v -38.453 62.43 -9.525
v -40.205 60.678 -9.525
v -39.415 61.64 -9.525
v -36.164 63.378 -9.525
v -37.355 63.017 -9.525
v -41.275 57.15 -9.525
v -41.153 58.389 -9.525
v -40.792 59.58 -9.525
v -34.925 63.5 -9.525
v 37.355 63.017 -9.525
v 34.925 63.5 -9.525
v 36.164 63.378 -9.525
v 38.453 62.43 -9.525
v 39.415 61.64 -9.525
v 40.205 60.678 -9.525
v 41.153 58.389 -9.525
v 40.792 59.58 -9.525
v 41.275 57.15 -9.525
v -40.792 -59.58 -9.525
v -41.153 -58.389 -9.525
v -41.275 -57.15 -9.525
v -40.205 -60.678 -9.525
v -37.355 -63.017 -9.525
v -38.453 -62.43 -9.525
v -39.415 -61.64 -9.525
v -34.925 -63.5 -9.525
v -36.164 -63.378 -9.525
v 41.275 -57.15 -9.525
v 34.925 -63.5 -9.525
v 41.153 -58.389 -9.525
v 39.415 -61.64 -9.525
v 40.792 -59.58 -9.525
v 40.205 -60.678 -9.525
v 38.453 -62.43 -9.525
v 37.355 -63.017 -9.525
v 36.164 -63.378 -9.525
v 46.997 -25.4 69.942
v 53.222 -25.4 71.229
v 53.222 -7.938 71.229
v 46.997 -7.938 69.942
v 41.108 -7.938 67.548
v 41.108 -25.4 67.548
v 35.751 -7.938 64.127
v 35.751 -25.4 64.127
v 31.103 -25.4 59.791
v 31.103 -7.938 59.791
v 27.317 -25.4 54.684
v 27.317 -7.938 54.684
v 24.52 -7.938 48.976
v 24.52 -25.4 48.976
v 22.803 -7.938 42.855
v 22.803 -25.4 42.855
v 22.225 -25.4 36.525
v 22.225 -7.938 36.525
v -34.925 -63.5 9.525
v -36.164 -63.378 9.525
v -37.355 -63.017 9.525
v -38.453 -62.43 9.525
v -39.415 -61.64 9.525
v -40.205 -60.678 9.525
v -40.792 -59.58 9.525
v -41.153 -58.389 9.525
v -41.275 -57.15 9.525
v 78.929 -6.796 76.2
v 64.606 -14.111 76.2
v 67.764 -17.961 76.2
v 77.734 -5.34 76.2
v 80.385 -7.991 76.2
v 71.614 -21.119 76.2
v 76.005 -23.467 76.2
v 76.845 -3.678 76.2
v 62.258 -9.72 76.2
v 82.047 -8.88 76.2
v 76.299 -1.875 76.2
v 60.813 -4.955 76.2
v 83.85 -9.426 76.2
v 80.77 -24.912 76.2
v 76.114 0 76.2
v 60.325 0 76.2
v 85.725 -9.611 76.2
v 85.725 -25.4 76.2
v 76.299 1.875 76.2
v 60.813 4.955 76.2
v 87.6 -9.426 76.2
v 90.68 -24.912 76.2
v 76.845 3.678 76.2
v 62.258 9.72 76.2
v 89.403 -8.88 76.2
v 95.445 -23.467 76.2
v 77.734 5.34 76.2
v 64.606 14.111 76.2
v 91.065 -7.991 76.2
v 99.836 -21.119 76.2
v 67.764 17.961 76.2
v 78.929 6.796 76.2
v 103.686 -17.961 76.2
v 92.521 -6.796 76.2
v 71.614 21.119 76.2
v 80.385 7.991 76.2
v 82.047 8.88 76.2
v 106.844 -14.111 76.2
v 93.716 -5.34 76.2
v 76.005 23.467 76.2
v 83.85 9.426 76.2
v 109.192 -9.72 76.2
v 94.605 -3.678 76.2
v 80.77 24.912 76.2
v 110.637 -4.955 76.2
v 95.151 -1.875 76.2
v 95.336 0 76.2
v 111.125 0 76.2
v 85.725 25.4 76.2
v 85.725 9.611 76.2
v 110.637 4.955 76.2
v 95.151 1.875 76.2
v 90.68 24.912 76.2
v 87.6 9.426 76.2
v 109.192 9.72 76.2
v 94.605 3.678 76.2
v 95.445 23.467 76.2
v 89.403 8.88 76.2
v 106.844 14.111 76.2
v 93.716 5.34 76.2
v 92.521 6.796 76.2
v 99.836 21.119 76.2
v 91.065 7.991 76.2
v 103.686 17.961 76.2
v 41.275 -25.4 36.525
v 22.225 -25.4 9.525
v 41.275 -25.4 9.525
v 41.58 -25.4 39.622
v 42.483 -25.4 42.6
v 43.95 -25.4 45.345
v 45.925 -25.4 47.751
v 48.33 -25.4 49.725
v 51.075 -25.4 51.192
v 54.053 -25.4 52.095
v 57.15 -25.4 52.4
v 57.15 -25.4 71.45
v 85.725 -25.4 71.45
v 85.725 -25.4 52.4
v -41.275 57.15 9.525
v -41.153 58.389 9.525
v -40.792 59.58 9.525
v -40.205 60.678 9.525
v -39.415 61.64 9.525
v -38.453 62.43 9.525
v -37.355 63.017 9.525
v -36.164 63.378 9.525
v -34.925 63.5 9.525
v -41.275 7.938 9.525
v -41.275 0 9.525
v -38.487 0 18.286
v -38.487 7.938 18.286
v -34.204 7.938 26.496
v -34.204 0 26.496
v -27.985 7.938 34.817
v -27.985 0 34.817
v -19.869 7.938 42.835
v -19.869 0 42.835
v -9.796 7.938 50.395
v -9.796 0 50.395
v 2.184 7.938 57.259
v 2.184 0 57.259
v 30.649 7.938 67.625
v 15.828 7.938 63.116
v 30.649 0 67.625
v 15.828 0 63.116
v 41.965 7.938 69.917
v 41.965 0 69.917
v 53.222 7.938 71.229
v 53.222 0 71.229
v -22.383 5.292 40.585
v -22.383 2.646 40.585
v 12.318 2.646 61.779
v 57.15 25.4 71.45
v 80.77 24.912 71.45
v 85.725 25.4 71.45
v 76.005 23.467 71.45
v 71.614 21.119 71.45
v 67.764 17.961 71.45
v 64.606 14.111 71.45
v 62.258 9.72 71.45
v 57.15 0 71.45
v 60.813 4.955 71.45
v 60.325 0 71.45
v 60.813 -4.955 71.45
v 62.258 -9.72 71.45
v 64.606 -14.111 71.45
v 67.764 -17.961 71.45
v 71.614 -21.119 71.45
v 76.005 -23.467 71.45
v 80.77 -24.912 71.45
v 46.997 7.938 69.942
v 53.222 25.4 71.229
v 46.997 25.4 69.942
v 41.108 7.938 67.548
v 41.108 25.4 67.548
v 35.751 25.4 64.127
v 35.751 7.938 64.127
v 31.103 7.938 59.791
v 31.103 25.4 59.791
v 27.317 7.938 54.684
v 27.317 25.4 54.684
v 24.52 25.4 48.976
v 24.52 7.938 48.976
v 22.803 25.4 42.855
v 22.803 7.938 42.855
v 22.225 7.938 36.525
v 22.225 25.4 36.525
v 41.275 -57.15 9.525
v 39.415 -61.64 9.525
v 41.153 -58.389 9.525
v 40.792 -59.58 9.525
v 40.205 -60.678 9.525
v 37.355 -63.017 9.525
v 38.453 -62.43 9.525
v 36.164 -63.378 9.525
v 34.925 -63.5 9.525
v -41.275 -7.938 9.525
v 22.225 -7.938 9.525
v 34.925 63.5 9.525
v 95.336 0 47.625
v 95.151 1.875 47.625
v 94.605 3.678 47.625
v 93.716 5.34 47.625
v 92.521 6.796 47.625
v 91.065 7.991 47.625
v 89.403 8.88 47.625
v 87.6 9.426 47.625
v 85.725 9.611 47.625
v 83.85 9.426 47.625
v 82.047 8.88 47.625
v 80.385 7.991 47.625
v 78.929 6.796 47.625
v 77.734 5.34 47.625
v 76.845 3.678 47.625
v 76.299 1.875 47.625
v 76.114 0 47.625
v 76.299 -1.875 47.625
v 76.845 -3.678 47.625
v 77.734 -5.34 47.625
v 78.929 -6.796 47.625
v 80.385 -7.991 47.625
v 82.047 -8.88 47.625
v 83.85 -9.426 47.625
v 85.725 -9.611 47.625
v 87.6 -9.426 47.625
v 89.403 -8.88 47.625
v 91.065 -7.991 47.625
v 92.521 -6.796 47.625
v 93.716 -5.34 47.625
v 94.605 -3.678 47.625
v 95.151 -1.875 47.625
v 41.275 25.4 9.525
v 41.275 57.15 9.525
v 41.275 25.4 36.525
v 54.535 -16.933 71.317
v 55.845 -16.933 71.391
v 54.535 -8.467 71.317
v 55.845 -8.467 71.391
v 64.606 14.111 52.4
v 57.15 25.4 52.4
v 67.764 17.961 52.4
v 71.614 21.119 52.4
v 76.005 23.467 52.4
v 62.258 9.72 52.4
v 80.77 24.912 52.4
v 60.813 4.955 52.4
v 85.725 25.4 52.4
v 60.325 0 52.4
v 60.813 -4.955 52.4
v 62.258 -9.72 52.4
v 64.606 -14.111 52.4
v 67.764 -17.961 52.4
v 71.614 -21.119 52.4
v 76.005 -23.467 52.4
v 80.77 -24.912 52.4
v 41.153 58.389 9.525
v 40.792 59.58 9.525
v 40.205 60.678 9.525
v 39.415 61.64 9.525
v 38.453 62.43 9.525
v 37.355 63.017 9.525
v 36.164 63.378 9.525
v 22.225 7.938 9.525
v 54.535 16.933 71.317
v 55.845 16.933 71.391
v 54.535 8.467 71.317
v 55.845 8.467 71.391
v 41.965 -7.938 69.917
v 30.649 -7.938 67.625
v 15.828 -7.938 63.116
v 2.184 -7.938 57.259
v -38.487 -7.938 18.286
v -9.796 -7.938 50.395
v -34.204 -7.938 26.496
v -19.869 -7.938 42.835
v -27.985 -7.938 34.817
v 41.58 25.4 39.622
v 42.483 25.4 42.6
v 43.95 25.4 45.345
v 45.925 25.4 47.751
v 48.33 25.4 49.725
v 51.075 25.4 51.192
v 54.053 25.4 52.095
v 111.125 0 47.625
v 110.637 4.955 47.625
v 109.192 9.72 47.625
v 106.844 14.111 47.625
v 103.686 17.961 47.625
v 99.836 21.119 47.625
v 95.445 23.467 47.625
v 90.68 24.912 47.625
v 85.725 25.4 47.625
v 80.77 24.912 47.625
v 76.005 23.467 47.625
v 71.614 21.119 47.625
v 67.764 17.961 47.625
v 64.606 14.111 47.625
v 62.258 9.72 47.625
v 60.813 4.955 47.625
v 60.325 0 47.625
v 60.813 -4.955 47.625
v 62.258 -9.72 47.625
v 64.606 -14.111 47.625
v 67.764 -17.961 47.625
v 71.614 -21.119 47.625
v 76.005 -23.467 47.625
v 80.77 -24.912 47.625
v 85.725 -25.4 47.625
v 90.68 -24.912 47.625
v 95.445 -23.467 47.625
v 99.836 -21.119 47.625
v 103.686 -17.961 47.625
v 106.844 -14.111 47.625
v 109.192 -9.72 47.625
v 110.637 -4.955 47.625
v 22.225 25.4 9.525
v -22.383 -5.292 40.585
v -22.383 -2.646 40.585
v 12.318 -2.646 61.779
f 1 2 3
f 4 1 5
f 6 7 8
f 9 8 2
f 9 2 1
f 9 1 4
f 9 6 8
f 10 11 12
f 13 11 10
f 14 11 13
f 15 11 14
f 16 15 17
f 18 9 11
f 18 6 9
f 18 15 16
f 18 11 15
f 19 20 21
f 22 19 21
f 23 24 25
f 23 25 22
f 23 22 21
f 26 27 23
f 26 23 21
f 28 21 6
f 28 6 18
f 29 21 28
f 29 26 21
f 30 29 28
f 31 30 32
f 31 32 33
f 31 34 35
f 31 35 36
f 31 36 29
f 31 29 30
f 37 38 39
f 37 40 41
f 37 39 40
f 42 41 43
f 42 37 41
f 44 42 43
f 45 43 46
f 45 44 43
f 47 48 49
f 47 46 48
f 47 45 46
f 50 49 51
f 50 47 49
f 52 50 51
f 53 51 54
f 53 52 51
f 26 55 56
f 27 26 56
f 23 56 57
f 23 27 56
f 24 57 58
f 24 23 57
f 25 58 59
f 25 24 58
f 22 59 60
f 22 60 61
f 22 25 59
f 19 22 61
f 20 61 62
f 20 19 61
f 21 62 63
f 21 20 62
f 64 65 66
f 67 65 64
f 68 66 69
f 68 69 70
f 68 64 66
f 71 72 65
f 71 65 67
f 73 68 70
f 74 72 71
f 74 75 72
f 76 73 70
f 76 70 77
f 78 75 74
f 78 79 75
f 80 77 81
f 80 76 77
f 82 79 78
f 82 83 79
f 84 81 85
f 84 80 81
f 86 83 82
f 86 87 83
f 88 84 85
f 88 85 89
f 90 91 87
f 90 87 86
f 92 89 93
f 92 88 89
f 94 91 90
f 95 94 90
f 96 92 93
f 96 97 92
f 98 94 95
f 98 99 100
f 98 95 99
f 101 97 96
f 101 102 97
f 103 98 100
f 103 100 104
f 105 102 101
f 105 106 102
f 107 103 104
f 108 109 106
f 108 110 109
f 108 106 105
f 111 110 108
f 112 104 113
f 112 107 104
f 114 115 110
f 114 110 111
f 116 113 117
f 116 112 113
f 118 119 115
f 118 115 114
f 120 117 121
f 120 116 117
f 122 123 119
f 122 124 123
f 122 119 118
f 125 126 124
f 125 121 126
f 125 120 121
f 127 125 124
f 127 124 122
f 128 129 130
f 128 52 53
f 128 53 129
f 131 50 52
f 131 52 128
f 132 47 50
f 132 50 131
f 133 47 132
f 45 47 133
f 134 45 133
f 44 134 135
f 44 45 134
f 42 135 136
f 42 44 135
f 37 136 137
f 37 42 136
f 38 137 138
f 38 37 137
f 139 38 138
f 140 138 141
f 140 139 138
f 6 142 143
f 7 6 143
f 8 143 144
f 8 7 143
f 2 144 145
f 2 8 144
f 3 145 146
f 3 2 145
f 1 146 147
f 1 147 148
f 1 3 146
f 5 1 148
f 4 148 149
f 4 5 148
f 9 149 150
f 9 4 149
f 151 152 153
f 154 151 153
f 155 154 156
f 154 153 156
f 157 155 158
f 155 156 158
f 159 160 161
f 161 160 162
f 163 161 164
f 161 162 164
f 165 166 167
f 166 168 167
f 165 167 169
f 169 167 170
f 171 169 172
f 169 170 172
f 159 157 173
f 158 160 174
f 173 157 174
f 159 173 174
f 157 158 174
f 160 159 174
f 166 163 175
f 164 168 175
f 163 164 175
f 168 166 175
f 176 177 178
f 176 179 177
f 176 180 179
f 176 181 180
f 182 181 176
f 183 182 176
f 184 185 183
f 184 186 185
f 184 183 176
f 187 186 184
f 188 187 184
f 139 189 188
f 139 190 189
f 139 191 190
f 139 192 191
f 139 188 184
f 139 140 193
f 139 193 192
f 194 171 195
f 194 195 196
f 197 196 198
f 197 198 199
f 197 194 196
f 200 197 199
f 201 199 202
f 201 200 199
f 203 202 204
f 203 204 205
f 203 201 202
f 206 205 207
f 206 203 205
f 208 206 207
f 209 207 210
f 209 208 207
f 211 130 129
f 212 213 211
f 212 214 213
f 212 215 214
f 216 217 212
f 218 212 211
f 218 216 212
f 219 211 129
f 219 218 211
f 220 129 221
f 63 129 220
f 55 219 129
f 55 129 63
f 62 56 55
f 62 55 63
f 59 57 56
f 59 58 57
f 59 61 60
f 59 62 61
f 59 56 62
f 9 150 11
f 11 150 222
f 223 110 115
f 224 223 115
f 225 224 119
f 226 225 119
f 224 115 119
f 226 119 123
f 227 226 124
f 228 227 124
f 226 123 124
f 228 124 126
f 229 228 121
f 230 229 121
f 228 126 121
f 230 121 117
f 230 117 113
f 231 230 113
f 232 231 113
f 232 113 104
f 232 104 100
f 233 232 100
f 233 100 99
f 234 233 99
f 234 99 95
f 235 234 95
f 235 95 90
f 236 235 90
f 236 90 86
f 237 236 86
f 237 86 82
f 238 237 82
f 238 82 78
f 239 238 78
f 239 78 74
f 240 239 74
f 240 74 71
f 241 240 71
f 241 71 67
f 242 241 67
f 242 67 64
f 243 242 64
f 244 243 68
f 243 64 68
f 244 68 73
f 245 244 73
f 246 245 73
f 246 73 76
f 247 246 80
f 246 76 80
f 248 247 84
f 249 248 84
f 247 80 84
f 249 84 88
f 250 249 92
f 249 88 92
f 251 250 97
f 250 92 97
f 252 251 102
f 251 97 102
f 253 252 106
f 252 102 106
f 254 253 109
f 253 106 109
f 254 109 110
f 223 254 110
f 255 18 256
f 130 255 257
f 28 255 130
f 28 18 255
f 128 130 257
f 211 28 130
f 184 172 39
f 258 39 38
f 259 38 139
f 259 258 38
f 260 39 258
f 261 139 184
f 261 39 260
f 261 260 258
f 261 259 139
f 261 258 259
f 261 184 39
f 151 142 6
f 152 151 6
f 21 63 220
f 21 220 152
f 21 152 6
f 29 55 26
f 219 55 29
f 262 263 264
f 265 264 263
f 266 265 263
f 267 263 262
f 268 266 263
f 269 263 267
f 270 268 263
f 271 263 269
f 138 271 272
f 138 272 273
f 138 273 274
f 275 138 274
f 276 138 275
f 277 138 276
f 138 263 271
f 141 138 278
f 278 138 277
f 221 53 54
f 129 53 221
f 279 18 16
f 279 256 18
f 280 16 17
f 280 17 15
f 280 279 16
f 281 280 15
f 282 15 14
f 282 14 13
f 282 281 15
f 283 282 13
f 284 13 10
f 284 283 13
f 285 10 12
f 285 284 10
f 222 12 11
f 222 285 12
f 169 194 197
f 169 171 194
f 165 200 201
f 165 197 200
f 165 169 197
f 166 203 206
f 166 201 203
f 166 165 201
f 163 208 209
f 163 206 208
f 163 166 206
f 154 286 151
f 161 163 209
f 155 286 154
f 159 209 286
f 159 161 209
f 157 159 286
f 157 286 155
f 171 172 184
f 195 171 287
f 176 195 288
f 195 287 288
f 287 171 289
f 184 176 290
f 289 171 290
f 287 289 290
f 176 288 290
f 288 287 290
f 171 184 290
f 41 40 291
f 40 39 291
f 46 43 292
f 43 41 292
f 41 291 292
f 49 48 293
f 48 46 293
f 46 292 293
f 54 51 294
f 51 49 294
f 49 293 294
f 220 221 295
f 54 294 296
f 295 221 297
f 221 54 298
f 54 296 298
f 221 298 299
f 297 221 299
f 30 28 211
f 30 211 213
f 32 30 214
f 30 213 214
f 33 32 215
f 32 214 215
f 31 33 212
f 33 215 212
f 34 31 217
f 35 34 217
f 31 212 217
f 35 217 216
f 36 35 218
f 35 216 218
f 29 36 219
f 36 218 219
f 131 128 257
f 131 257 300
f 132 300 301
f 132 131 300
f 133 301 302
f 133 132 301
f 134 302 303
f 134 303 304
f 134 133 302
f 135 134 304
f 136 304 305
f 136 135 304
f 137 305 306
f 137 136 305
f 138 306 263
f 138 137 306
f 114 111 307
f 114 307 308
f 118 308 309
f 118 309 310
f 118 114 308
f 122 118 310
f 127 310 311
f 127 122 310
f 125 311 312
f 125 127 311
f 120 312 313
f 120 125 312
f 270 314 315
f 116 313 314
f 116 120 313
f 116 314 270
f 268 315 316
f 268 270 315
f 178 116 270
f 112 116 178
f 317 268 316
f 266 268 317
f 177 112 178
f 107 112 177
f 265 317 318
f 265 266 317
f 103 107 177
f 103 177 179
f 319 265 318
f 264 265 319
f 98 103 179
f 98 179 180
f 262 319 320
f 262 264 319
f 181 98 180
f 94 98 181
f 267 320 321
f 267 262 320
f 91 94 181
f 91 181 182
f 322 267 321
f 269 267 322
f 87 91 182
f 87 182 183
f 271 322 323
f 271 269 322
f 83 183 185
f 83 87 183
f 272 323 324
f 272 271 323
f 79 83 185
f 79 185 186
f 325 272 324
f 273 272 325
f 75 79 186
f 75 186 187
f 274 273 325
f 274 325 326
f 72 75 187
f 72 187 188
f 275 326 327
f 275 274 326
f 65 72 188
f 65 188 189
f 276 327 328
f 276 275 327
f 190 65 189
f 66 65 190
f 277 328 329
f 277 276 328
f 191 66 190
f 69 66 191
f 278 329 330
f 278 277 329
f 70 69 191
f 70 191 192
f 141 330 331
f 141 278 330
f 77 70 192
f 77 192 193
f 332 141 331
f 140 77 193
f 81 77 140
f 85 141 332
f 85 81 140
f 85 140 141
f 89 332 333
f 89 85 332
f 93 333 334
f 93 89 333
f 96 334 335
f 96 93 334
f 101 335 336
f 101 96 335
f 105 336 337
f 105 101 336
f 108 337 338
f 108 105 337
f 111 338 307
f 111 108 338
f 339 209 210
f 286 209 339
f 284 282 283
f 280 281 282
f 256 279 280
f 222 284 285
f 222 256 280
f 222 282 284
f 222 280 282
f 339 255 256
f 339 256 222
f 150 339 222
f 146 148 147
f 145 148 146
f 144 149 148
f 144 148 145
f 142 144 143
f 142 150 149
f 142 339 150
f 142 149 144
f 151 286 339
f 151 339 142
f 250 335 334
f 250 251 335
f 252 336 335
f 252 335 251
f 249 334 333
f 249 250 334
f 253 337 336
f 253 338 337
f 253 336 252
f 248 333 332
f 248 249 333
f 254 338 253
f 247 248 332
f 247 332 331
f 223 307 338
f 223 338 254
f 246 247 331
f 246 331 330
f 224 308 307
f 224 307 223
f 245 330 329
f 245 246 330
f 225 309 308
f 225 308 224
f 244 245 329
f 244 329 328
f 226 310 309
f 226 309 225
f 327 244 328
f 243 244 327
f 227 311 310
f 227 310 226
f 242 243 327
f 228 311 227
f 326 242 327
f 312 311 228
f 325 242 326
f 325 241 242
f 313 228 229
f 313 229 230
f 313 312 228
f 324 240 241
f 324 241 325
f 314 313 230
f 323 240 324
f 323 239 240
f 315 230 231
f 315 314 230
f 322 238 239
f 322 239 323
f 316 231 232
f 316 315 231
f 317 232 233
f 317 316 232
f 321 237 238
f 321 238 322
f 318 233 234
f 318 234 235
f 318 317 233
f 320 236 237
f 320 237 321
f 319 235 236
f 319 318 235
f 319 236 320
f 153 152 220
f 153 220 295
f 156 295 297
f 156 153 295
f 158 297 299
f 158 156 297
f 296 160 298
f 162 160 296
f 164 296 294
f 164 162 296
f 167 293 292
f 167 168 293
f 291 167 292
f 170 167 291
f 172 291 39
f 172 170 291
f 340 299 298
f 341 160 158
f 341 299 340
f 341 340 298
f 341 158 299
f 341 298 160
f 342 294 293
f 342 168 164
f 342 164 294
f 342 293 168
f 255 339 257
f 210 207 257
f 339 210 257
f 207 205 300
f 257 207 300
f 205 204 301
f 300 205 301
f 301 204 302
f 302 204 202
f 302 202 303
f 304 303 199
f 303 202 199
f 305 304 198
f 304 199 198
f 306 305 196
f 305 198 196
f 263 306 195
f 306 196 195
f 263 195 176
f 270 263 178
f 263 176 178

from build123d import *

# Parameters (mm, degrees)
F1_DEPTH = 63.5
F2_DEPTH = 25.4
F3_DEPTH = 7.9375
F5_R     = 6.35
F6_R     = 9.6111188935
F7_DEPTH = 85.726


with BuildPart() as f1:
    # F0 (on Front) → F1 (new body, symmetric)
    with BuildSketch(Plane.XZ):
        Polygon((-41.275, 9.525), (-41.275, -9.525), (41.275, -9.525), (41.275, 9.525), (22.225, 9.525), align=None)
    extrude(amount=F1_DEPTH, both=True)

    # F0 (on Front) → F2 (join, symmetric)
    with BuildSketch(Plane.XZ):
        with BuildLine():
            Line((22.225, 9.525), (41.275, 9.525))
            Line((41.275, 9.525), (41.275, 36.5252))
            ThreePointArc((41.275, 36.5252), (45.9246798487, 47.7505201513), (57.15, 52.4002))
            Line((57.15, 52.4002), (60.325, 52.4002))
            Line((60.325, 52.4002), (60.325, 71.4502))
            Line((60.325, 71.4502), (57.15, 71.4502))
            add(Edge.make_bspline(
                [(53.2220163185, 71.2286086107), (54.5371358708, 71.3237902727), (55.8469463929, 71.3977482988), (57.15, 71.4502)],
                knots=[112.6539740509, 112.6539740509, 112.6539740509, 112.6539740509, 116.2850421165, 116.2850421165, 116.2850421165, 116.2850421165], degree=3))
            ThreePointArc((53.2220163185, 71.2286086107), (31.1025389426, 59.790740988), (22.225, 36.5252))
            Line((22.225, 36.5252), (22.225, 9.525))
        make_face()
        Polygon((85.725, 71.4502), (60.325, 71.4502), (60.325, 52.4002), (85.725, 52.4002), (85.725, 61.9125), align=None)
    extrude(amount=F2_DEPTH, both=True)

    # F0 (on Front) → F3 (join, symmetric)
    with BuildSketch(Plane.XZ):
        with BuildLine():
            add(Edge.make_bspline(
                [(-41.275, 9.525), (-33.4914332719, 44.8937261862), (12.4204005857, 68.2755952564), (53.2220163185, 71.2286086107)],
                knots=[0, 0, 0, 0, 112.6539740509, 112.6539740509, 112.6539740509, 112.6539740509], degree=3))
            Line((-41.275, 9.525), (22.225, 9.525))
            Line((22.225, 9.525), (22.225, 36.5252))
            ThreePointArc((22.225, 36.5252), (31.1025389426, 59.790740988), (53.2220163185, 71.2286086107))
        make_face()
    extrude(amount=F3_DEPTH, both=True)

    # F0 (on Front) → F4 (revolve)
    with BuildSketch(Plane.XZ):
        Polygon((85.725, 76.2), (85.725, 71.4502), (85.725, 61.9125), (85.725, 52.4002), (85.725, 47.625), (111.125, 47.625), (111.125, 76.2), align=None)
    revolve(axis=Axis((85.725, 0, 69.05625), (0, 0, 1)))

    # F5
    f5_edges = [f1.edges().sort_by_distance(p)[0] for p in [
        (41.275, -63.5, 0),
        (-41.275, -63.5, 0),
        (41.275, 63.5, 0),
        (-41.275, 63.5, 0),
    ]]
    fillet(f5_edges, radius=F5_R)

    # F6 (on face) → F7 (cut, through all)
    with BuildSketch(Plane.XY.offset(76.2)):
        with Locations((85.725, 0)):
            Circle(F6_R)
    extrude(amount=-F7_DEPTH, mode=Mode.SUBTRACT)


solid = f1.part
